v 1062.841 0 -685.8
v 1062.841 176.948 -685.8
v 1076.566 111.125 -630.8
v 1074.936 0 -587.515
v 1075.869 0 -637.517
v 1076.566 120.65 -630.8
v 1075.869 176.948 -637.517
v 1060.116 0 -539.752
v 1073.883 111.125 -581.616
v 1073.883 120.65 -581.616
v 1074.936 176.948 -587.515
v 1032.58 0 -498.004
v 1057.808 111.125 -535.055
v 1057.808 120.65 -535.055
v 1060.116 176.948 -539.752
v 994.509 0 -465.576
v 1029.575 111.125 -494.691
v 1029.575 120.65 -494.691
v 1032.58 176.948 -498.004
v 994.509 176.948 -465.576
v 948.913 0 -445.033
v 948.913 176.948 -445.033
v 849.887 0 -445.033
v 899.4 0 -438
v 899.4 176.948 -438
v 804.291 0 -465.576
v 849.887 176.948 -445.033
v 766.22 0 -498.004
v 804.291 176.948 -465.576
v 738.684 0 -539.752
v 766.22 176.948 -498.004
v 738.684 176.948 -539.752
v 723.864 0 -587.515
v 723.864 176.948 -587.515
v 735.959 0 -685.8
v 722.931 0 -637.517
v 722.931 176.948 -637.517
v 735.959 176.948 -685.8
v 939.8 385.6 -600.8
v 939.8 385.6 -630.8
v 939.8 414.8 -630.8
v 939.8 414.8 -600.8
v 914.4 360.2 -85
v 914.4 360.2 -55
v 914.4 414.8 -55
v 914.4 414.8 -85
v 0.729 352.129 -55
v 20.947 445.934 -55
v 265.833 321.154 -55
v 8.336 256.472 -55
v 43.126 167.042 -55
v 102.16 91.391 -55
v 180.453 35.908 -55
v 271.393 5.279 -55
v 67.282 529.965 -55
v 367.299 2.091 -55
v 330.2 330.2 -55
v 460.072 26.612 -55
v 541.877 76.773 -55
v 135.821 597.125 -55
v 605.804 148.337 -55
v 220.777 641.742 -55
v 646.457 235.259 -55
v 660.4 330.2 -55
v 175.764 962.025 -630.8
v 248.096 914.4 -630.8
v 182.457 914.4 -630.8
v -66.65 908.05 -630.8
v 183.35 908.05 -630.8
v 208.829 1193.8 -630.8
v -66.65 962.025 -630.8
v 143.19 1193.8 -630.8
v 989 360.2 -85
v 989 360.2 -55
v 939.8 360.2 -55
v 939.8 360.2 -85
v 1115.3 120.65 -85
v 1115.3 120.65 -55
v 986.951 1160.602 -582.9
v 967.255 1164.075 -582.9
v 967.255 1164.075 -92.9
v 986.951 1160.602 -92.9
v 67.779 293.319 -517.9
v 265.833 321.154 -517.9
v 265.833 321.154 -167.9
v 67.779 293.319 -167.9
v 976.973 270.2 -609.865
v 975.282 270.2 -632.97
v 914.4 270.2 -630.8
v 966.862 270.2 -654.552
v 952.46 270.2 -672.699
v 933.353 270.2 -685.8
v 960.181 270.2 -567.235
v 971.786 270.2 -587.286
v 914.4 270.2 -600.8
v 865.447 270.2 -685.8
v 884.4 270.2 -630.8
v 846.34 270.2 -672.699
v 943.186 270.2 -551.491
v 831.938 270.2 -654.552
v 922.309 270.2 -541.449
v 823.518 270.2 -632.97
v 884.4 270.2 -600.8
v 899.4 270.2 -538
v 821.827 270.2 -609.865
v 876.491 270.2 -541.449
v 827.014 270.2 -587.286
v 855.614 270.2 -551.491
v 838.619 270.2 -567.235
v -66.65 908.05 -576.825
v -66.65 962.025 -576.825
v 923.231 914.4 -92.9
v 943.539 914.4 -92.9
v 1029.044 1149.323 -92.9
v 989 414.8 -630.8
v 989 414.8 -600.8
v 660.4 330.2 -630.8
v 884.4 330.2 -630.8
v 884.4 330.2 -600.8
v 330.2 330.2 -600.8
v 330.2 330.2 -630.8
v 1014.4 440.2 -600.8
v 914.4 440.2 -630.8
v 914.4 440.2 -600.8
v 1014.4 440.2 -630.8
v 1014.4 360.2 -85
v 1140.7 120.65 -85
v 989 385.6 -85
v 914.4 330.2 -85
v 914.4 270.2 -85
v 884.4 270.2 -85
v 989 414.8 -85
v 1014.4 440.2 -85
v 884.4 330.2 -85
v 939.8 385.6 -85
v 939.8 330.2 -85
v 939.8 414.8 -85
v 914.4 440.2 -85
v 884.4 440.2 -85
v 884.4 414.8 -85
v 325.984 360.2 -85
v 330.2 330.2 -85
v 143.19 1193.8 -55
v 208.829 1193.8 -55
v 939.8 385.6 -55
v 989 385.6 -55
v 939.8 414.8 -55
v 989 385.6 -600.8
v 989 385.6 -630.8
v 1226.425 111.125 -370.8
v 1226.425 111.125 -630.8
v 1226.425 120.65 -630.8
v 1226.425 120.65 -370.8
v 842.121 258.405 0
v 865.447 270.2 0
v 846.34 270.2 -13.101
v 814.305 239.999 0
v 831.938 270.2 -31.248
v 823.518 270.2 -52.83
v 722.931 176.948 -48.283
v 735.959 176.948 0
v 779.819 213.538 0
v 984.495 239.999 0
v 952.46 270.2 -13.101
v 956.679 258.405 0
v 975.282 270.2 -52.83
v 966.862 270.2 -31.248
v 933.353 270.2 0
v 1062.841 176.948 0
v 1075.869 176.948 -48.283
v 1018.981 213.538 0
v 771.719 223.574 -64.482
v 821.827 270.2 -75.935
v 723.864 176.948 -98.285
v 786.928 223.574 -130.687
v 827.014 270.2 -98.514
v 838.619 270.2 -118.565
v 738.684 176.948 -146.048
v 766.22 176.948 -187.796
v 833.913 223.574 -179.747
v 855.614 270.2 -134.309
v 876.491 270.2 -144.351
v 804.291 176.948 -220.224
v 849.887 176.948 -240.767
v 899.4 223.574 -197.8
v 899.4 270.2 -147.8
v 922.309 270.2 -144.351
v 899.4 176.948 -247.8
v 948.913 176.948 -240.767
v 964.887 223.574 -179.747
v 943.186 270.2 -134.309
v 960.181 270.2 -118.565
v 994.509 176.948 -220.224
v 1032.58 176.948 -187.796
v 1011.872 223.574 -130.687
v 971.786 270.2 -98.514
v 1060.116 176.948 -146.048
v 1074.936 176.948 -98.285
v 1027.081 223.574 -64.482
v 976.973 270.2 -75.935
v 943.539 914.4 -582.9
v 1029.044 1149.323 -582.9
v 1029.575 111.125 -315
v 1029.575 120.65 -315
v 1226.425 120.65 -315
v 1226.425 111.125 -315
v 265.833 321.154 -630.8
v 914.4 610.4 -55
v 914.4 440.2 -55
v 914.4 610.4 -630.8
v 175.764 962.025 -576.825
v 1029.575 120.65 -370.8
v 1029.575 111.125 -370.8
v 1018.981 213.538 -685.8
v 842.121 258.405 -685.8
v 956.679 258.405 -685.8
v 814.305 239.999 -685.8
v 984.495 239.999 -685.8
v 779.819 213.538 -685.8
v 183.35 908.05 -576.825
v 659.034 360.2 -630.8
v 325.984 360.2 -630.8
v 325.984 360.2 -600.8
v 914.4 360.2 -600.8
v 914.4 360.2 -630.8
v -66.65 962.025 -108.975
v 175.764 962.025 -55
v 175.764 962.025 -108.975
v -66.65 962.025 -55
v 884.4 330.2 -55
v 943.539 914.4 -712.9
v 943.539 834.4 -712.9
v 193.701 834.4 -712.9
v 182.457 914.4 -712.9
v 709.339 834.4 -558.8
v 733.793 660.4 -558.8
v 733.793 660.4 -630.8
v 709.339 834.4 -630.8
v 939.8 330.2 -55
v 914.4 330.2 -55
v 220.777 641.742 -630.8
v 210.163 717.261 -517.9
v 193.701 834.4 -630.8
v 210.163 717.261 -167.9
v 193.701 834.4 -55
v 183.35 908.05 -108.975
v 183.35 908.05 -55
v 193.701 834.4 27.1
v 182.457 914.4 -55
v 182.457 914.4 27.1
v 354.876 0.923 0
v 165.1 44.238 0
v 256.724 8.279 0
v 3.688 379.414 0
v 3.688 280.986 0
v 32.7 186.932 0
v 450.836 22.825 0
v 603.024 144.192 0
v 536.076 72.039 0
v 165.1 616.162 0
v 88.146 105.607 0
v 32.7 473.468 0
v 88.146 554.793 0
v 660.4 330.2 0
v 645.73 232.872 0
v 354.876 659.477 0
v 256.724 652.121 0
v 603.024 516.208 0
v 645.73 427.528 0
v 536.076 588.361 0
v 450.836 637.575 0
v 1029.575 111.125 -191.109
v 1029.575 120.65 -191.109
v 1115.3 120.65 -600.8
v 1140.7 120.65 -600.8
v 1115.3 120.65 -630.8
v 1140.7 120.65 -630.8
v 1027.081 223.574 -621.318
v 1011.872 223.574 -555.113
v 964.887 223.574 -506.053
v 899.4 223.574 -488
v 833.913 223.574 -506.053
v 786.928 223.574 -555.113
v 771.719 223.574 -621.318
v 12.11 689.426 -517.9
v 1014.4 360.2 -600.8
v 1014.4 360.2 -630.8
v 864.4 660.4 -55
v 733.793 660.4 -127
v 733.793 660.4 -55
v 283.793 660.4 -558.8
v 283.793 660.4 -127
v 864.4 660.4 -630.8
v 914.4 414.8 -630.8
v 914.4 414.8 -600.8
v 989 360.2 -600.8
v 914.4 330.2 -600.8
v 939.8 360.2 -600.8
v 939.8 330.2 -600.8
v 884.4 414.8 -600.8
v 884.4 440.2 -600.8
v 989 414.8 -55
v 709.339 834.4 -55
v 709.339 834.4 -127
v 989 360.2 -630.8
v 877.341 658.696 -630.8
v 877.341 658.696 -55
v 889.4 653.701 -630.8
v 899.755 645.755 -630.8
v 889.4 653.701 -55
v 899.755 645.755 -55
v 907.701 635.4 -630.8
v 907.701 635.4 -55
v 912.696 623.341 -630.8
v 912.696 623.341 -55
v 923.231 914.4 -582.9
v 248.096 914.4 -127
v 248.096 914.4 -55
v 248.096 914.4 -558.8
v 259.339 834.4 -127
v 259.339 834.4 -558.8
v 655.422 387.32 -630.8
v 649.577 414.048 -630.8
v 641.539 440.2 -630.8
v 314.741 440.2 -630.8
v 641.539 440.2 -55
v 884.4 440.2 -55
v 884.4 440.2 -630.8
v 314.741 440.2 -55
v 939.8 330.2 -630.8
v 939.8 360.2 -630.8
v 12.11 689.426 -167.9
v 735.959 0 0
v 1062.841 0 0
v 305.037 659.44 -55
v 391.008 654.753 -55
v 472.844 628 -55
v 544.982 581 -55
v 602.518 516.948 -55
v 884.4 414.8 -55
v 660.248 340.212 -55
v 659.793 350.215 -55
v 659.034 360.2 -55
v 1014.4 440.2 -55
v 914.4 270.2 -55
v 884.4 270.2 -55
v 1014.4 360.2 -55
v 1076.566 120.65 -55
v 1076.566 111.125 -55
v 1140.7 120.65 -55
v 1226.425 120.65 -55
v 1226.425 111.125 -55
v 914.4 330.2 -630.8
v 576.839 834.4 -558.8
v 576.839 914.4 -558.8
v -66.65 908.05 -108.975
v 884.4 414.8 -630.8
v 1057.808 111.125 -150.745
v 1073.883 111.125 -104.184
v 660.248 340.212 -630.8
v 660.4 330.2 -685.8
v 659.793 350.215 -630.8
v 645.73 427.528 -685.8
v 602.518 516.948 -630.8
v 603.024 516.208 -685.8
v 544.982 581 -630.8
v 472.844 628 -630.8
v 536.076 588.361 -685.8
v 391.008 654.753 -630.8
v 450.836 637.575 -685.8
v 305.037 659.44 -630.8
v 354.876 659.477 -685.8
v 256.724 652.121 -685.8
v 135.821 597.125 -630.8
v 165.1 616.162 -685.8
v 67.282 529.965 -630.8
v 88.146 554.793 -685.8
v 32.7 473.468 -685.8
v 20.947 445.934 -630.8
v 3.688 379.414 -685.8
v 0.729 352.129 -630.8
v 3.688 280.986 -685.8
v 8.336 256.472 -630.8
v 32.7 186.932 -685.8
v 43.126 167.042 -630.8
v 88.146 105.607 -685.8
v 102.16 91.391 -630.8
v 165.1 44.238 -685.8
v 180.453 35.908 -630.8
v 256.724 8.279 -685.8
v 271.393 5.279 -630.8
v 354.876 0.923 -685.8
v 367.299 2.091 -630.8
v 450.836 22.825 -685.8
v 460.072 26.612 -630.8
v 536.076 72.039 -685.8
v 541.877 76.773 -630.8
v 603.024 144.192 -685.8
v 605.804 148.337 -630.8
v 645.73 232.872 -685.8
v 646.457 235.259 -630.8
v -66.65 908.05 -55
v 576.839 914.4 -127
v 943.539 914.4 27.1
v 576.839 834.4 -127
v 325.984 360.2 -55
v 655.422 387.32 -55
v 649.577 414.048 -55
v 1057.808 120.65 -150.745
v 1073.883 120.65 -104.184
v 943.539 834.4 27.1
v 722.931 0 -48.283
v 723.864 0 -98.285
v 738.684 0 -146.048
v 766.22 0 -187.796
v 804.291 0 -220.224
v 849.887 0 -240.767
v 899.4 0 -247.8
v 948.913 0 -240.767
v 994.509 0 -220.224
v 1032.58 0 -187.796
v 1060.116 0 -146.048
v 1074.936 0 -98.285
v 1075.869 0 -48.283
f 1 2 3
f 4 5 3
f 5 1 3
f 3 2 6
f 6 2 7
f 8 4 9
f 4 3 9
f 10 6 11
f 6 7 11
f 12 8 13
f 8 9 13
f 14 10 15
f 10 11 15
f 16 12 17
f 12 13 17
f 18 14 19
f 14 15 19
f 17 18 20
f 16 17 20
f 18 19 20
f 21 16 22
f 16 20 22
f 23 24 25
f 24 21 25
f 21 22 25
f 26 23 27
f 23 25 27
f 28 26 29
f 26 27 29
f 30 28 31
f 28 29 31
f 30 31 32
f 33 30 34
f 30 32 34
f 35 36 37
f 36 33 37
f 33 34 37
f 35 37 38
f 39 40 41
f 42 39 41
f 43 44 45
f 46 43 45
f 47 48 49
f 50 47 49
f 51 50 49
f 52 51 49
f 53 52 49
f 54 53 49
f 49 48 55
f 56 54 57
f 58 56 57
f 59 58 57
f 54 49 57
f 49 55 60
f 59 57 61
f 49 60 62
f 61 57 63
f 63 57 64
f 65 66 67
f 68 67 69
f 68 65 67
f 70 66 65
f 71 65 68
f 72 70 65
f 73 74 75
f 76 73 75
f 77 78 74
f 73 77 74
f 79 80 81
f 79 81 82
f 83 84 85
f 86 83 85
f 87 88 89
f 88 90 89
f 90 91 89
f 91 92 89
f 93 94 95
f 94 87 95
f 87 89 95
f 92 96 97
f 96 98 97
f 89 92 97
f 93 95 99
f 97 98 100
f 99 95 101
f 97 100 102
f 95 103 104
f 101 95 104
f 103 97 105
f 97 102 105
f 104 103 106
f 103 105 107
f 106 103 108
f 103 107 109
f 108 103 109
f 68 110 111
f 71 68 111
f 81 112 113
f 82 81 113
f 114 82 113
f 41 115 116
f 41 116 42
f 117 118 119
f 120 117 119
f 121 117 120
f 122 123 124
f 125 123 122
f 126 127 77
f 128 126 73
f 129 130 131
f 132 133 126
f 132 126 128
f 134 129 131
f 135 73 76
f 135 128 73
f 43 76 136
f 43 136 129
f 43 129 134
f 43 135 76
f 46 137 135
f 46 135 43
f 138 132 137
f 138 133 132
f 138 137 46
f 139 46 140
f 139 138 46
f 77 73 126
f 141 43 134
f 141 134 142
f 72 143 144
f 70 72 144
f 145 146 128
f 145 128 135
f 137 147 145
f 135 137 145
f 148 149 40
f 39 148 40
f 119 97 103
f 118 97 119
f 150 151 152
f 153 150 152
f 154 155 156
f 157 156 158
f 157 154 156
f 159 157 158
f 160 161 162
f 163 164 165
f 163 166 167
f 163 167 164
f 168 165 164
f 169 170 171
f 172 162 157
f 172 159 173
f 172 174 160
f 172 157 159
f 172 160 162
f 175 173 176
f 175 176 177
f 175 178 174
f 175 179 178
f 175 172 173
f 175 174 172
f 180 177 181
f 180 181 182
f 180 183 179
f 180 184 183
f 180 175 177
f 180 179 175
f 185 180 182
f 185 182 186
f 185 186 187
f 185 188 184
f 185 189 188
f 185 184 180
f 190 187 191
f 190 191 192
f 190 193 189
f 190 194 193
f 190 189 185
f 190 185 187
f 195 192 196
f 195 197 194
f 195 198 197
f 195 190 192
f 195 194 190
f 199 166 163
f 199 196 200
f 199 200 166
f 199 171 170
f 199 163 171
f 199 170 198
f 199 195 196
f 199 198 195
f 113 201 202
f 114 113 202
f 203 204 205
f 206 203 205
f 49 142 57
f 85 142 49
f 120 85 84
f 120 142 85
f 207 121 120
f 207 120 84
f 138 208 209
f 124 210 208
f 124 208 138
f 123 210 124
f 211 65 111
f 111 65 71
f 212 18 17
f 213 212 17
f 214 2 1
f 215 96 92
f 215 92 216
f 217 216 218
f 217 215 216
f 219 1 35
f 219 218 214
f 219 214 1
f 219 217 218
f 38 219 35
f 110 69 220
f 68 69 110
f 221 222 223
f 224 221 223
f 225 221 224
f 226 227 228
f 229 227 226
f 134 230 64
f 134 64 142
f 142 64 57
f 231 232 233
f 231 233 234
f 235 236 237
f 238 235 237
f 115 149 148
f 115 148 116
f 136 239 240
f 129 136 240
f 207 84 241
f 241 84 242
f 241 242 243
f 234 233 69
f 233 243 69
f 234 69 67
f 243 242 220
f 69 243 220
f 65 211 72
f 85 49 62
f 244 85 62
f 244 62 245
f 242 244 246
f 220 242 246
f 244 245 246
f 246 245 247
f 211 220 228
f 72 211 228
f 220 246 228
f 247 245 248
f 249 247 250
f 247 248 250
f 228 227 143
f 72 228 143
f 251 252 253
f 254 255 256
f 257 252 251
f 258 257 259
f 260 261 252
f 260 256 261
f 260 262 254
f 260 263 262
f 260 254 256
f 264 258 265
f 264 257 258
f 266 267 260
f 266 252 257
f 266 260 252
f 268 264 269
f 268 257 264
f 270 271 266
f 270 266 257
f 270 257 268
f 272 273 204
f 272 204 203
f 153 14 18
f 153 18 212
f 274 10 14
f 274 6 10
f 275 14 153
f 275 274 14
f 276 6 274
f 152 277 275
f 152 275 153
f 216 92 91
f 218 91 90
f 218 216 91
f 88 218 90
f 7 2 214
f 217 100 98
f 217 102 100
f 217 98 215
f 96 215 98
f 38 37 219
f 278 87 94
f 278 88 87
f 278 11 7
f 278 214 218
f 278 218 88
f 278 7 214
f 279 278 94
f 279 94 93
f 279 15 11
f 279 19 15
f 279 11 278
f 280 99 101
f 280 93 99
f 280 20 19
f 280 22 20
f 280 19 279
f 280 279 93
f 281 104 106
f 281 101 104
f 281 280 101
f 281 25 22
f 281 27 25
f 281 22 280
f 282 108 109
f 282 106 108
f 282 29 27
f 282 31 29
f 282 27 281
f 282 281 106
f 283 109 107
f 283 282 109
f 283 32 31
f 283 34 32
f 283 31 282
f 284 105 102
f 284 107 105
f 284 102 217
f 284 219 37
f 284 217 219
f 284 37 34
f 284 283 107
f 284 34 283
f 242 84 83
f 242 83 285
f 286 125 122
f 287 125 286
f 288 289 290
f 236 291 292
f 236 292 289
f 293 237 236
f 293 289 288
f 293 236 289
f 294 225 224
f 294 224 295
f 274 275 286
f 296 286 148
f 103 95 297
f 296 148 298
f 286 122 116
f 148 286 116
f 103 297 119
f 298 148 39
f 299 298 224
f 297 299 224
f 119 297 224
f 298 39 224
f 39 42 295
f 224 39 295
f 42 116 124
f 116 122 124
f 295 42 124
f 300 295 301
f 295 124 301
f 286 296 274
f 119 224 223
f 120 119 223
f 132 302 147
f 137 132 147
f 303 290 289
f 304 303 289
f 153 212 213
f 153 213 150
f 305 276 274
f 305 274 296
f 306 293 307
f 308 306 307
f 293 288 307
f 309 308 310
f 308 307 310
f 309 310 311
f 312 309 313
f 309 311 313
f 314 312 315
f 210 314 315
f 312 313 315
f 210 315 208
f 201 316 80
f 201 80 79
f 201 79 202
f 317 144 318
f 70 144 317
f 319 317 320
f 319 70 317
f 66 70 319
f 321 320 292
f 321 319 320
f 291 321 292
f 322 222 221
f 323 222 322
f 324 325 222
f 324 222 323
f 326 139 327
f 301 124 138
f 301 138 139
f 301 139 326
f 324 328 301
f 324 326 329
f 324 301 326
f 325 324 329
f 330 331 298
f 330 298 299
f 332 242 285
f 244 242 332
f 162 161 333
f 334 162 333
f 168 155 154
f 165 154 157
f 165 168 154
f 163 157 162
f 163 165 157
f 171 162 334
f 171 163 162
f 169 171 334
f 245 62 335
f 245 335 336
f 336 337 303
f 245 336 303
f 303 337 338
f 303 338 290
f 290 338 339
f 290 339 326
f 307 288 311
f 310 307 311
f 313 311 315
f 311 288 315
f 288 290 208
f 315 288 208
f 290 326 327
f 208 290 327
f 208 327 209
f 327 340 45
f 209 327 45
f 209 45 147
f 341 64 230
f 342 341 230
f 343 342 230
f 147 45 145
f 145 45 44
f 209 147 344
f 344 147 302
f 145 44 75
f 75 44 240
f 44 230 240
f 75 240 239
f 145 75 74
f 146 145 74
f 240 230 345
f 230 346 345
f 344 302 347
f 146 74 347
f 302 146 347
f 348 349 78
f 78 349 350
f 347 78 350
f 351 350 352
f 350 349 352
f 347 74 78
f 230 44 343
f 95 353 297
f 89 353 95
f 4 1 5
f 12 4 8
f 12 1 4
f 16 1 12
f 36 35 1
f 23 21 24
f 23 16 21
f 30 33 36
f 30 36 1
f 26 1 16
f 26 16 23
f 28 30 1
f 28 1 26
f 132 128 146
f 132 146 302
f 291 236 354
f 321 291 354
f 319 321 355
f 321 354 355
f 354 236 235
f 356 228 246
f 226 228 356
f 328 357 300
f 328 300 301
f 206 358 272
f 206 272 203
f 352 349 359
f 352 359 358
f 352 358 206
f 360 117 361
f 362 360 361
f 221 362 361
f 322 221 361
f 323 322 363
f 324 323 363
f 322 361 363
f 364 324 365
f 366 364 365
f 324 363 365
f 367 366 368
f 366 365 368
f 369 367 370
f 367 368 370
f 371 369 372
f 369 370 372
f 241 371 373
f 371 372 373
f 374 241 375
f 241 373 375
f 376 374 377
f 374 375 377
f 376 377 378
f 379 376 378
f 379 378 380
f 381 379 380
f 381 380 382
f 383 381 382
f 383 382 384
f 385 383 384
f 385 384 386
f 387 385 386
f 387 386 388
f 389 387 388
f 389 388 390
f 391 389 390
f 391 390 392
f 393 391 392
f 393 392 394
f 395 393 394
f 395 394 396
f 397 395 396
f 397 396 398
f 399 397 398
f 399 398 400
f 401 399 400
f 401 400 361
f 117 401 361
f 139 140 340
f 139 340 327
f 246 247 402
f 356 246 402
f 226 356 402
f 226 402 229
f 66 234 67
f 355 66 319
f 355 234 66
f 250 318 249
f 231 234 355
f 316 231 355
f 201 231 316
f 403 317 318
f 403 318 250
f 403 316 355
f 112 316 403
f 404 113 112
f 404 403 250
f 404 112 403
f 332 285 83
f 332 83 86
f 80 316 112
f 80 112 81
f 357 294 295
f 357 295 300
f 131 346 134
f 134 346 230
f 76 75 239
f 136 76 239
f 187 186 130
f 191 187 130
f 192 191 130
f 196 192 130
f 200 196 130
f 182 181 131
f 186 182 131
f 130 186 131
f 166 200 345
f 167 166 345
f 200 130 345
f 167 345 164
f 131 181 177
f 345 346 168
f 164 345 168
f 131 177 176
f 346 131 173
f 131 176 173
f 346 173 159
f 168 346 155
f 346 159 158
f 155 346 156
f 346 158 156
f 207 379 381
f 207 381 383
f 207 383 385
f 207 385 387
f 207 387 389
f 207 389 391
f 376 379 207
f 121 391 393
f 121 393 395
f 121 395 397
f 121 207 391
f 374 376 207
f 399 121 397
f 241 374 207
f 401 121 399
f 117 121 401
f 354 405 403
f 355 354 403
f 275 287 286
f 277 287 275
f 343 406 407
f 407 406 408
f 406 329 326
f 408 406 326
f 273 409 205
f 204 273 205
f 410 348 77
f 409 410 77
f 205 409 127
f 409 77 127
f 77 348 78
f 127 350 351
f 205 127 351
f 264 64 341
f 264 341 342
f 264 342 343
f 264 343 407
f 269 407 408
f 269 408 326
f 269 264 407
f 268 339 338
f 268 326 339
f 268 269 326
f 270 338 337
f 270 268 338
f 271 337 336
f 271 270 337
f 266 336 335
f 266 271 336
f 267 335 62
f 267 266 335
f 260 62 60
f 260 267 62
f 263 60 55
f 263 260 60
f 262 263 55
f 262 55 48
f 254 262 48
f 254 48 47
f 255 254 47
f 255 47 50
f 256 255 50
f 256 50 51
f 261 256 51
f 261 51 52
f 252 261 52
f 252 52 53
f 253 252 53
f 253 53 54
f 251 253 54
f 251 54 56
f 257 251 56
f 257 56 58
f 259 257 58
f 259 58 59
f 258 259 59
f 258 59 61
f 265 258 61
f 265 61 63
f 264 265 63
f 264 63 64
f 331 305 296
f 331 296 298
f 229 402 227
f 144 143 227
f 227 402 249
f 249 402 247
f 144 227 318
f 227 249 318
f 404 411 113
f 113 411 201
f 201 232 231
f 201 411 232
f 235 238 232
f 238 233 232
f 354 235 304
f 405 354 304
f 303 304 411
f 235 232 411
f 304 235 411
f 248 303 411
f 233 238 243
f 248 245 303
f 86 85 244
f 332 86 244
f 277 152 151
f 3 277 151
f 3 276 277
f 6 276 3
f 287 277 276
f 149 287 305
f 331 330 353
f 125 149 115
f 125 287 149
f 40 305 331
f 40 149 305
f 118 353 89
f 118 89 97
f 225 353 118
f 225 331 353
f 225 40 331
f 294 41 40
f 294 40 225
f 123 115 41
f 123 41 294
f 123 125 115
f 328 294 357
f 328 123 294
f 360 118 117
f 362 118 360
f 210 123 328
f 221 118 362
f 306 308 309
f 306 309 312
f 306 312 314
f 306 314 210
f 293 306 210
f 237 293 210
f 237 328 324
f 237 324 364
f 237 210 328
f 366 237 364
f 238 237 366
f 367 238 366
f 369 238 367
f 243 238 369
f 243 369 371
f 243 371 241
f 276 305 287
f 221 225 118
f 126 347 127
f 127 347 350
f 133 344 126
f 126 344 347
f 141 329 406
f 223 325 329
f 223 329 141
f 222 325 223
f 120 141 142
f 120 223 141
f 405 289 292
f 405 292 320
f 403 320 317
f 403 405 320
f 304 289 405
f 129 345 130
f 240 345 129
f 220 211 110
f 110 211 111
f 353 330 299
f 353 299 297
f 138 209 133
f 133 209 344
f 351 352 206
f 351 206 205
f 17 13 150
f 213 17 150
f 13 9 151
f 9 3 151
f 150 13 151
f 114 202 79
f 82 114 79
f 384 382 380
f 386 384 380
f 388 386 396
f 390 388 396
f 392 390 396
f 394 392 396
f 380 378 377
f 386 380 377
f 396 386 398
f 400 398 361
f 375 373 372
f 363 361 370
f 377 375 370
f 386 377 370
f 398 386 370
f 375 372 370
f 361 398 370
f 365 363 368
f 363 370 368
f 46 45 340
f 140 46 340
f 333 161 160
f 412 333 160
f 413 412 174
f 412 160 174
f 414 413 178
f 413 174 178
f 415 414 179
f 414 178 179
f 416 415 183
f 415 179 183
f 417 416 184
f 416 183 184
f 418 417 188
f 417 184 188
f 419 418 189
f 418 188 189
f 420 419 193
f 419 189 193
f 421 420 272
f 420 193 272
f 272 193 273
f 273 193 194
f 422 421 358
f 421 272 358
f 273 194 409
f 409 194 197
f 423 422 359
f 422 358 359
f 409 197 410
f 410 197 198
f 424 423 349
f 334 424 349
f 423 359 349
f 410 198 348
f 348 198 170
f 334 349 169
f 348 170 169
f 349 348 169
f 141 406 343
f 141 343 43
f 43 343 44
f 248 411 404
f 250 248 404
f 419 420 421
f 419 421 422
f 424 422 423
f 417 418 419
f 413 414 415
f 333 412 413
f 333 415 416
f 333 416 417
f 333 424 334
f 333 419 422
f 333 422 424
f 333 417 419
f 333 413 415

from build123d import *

# Parameters (mm, degrees)
SKETCH1_R                 = 330.2
BOSS_EXTRUDE1_DEPTH       = 55
SKETCH2_R                 = 330.2
BOSS_EXTRUDE2_DEPTH       = 55
BOSS_EXTRUDE3_DEPTH       = 10
BOSS_EXTRUDE6_DEPTH       = 575.8
BOSS_EXTRUDE33_DEPTH      = 370
BOSS_EXTRUDE33_DEPTH_BACK = 370
SKETCH25_W                = 366.7
SKETCH25_H                = 80
SKETCH5_W                 = 450
SKETCH5_H                 = 72
BOSS_EXTRUDE7_DEPTH       = 367.981167426
SKETCH8_W                 = 49.2
SKETCH8_H                 = 29.2
BOSS_EXTRUDE13_DEPTH      = 30
SKETCH19_R                = 177.8
BOSS_EXTRUDE22_DEPTH      = 270.2
CHAMFER1_SIZE             = 100
CHAMFER1_SIZE2            = 93.251508614
BOSS_EXTRUDE27_DEPTH      = 30
BOSS_EXTRUDE20_DEPTH      = 260
SKETCH23_W                = 30
SKETCH23_H                = 60
SKETCH23_W_2              = 49.2
SKETCH23_H_2              = 25.4
SKETCH23_W_3              = 25.4
BOSS_EXTRUDE28_DEPTH      = 30
SKETCH24_R                = 177.8
BOSS_EXTRUDE29_DEPTH      = 270.2
CHAMFER2_SIZE             = 100
CHAMFER2_SIZE2            = 93.251508614
BOSS_EXTRUDE30_DEPTH      = 30
BOSS_EXTRUDE31_DEPTH      = 260
SKETCH16_W                = 250
SKETCH16_H                = 53.975
BOSS_EXTRUDE18_DEPTH      = 53.975
SKETCH18_W                = 250
SKETCH18_H                = 53.975
BOSS_EXTRUDE19_DEPTH      = 53.975
BOSS_EXTRUDE32_REACH      = 1866.083
BOSS_EXTRUDE34_REACH      = 1575.824
SKETCH26_W                = 154.1
SKETCH26_H                = 80
SKETCH27_W                = 350
SKETCH27_H                = 400
BOSS_EXTRUDE35_DEPTH      = 200
BOSS_EXTRUDE36_START      = -130
BOSS_EXTRUDE36_DEPTH      = 490
FILLET3_R                 = 50
SKETCH30_W                = 2623.123535912
SKETCH30_H                = 2390.43733062
CUT_EXTRUDE1_DEPTH        = 1887.551796433
SKETCH31_W                = 2584.765961417
SKETCH31_H                = 1828.147621016
CUT_EXTRUDE2_DEPTH        = 1855.050466041


with BuildPart() as part:
    # Sketch1 → Boss-Extrude1 (new body)
    with BuildSketch(Plane.XY):
        with Locations((330.2, 330.2)):
            Circle(SKETCH1_R)
    extrude(amount=-BOSS_EXTRUDE1_DEPTH)



with BuildPart() as body_2:
    # Sketch2 → Boss-Extrude2 (new body)
    with BuildSketch(Plane.XY.offset(-685.8)):
        with Locations((330.2, 330.2)):
            Circle(SKETCH2_R)
    extrude(amount=BOSS_EXTRUDE2_DEPTH)


with BuildPart() as part_1:
    add(part.part)

    add(body_2.part)  # Boss-Extrude3 merges body 2
    # 3DSketch2 → Boss-Extrude3 (add)
    with BuildSketch(Plane(origin=(330.2, 460, -630.8), x_dir=(0.5893057409504111, 0, 0.807910108664873), z_dir=(0, -1, 0))):
        Polygon((465.194640569, 339.322245639), (0, 0), (247.508411199, -339.322245639), (712.703051768, 0), align=None)
        Polygon((-38.304873162, 52.514157063), (0, 0), (465.194640569, 339.322245639), (426.889767407, 391.836402702), align=None)
    extrude(amount=-BOSS_EXTRUDE3_DEPTH)

    # Sketch4 → Boss-Extrude6 (add)
    with BuildSketch(Plane(origin=(0, -170.8, -630.8), x_dir=(1, 0, 0), z_dir=(0, 0, 1))):
        Polygon((208.828935151, 1364.6), (330.2, 501), (265.832575532, 491.953748438), (143.190142937, 1364.6), align=None)
    extrude(amount=BOSS_EXTRUDE6_DEPTH)

    # Sketch5 → Boss-Extrude7 (add, along a direction that is not the sketch's normal)
    with BuildSketch(Plane(origin=(0, 470, 0), x_dir=(1, 0, 0), z_dir=(0, 1, 0))):
        with Locations((535.552391309, 91)):
            Rectangle(SKETCH5_W, SKETCH5_H)
        with Locations((535.552391309, 594.8)):
            Rectangle(SKETCH5_W, SKETCH5_H)
    extrude(amount=BOSS_EXTRUDE7_DEPTH, dir=(-0.13917310096006222, 0.9902680687415708, 0))

    # Sketch8 → Boss-Extrude13 (add)
    with BuildSketch(Plane(origin=(0, 0, -630.8), x_dir=(-1, 0, 0), z_dir=(0, 0, -1))):
        Polygon((-1014.4, 360.2), (-939.8, 360.2), (-939.8, 330.2), (-914.4, 330.2), (-914.4, 270.2), (-884.4, 270.2), (-884.4, 330.2), (-330.2, 330.2), (-325.983774959, 360.2), (-914.4, 360.2), (-914.4, 414.8), (-884.4, 414.8), (-884.4, 440.2), (-1014.4, 440.2), align=None)
        with Locations((-964.4, 400.2)):
            Rectangle(SKETCH8_W, SKETCH8_H, mode=Mode.SUBTRACT)
    extrude(amount=-BOSS_EXTRUDE13_DEPTH)

    # Sketch19 → Boss-Extrude22 (add)
    with BuildSketch(Plane.XZ.offset(-270.2)):
        with Locations(Location((899.4, -615.8, 0), (0, 0, 90))):
            Circle(SKETCH19_R)
    extrude(amount=BOSS_EXTRUDE22_DEPTH)

    # Chamfer1
    chamfer1_edges = [part_1.edges().sort_by_distance(p)[0] for p in [
        (899.4, 270.2, -793.6),
    ]]
    chamfer1_side = [part_1.faces().sort_by_distance(p)[0] for p in [
        (899.4, 270.2, -788.571056572),
    ]]
    chamfer(chamfer1_edges, length=CHAMFER1_SIZE, length2=CHAMFER1_SIZE2, reference=chamfer1_side[0])

    # Sketch8<7> → Boss-Extrude27 (add)
    with BuildSketch(Plane(origin=(0, 0, -630.8), x_dir=(-1, 0, 0), z_dir=(0, 0, -1))):
        Polygon((-1014.4, 360.2), (-1140.7, 120.65), (-1115.3, 120.65), (-989, 360.2), align=None)
    extrude(amount=-BOSS_EXTRUDE27_DEPTH)

    # Sketch8<4> → Boss-Extrude20 (add)
    with BuildSketch(Plane(origin=(0, 0, -630.8), x_dir=(-1, 0, 0), z_dir=(0, 0, -1))):
        Polygon((-1226.425, 111.125), (-1226.425, 120.65), (-1140.7, 120.65), (-1115.3, 120.65), (-1029.575, 120.65), (-1029.575, 111.125), align=None)
    extrude(amount=-BOSS_EXTRUDE20_DEPTH)

    # Sketch23 → Boss-Extrude28 (add)
    with BuildSketch(Plane(origin=(0, 0, -55), x_dir=(-1, 0, 0), z_dir=(0, 0, -1))):
        with BuildLine():
            Line((-330.2, 360.2), (-659.034365601, 360.2))
            ThreePointArc((-659.034365601, 360.2), (-660.058414719, 345.215533268), (-660.4, 330.2))
            Line((-660.4, 330.2), (-330.2, 330.2))
            Line((-330.2, 330.2), (-330.2, 360.2))
        make_face()
        with BuildLine():
            Line((-914.4, 360.2), (-939.8, 360.2))
            Line((-939.8, 360.2), (-939.8, 330.2))
            Line((-939.8, 330.2), (-914.4, 330.2))
            Line((-914.4, 330.2), (-884.4, 330.2))
            Line((-884.4, 330.2), (-660.4, 330.2))
            ThreePointArc((-660.4, 330.2), (-660.058414719, 345.215533268), (-659.034365601, 360.2))
            Line((-659.034365601, 360.2), (-914.4, 360.2))
        make_face()
        with Locations((-899.4, 300.2)):
            Rectangle(SKETCH23_W, SKETCH23_H)
        Polygon((-939.8, 385.6), (-939.8, 360.2), (-914.4, 360.2), (-914.4, 414.8), (-914.4, 440.2), (-939.8, 440.2), (-939.8, 414.8), align=None)
        with Locations((-964.4, 372.9)):
            Rectangle(SKETCH23_W_2, SKETCH23_H_2)
        with Locations((-964.4, 427.5)):
            Rectangle(SKETCH23_W_2, SKETCH23_H_2)
        Polygon((-1014.4, 440.2), (-1014.4, 385.6), (-989, 385.6), (-989, 414.8), (-989, 440.2), align=None)
        with Locations((-1001.7, 372.9)):
            Rectangle(SKETCH23_W_3, SKETCH23_H_2)
        Polygon((-325.983774959, 360.2), (-330.2, 360.2), (-330.2, 330.2), align=None)
        with Locations((-899.4, 427.5)):
            Rectangle(SKETCH23_W, SKETCH23_H_2)
    extrude(amount=BOSS_EXTRUDE28_DEPTH)

    # Sketch24 → Boss-Extrude29 (add)
    with BuildSketch(Plane(origin=(0, 270.2, 0), x_dir=(-1, 0, 0), z_dir=(0, -1, 0))):
        with Locations(Location((-899.4, 70, 0), (0, 0, 270))):
            Circle(SKETCH24_R)
    extrude(amount=BOSS_EXTRUDE29_DEPTH)

    # Chamfer2
    chamfer2_edges = [part_1.edges().sort_by_distance(p)[0] for p in [
        (899.4, 270.2, -247.8),
    ]]
    chamfer2_side = [part_1.faces().sort_by_distance(p)[0] for p in [
        (899.4, 270.2, -242.771056572),
    ]]
    chamfer(chamfer2_edges, length=CHAMFER2_SIZE, length2=CHAMFER2_SIZE2, reference=chamfer2_side[0])

    # Sketch23<10> → Boss-Extrude30 (add)
    with BuildSketch(Plane(origin=(0, 0, -55), x_dir=(-1, 0, 0), z_dir=(0, 0, -1))):
        Polygon((-1014.4, 360.2), (-1140.7, 120.65), (-1115.3, 120.65), (-989, 360.2), align=None)
    extrude(amount=BOSS_EXTRUDE30_DEPTH)

    # Sketch23<12> → Boss-Extrude31 (add)
    with BuildSketch(Plane(origin=(0, 0, -55), x_dir=(-1, 0, 0), z_dir=(0, 0, -1))):
        Polygon((-1226.425, 111.125), (-1226.425, 120.65), (-1140.7, 120.65), (-1115.3, 120.65), (-1029.575, 120.65), (-1029.575, 111.125), align=None)
    extrude(amount=BOSS_EXTRUDE31_DEPTH)

    # Sketch16 → Boss-Extrude18 (add)
    with BuildSketch(Plane(origin=(0, 0, -630.8), x_dir=(-1, 0, 0), z_dir=(0, 0, -1))):
        with Locations((-58.349686454, 935.0375)):
            Rectangle(SKETCH16_W, SKETCH16_H)
    extrude(amount=-BOSS_EXTRUDE18_DEPTH)

    # Sketch18 → Boss-Extrude19 (add)
    with BuildSketch(Plane(origin=(0, 0, -55), x_dir=(-1, 0, 0), z_dir=(0, 0, -1))):
        with Locations((-58.349686454, 935.0375)):
            Rectangle(SKETCH18_W, SKETCH18_H)
    extrude(amount=BOSS_EXTRUDE19_DEPTH)

    # Boss-Extrude32: up to this face of the body (flat: up to its plane)
    boss_extrude32_end = Plane(part_1.part.faces().sort_by_distance((283.205191665, 255.458003874, -55))[0])
    # Sketch8<8> → Boss-Extrude32 (add, up to the picked face)
    with BuildSketch(Plane(origin=(0, 0, -630.8), x_dir=(-1, 0, 0), z_dir=(0, 0, -1)), mode=Mode.PRIVATE) as boss_extrude32_sk1:
        Polygon((-314.740508183, 440.2), (-283.793416381, 660.4), (-914.4, 660.4), (-914.4, 440.2), align=None)
    boss_extrude32_tool1 = split(extrude(boss_extrude32_sk1.sketch, amount=-BOSS_EXTRUDE32_REACH, mode=Mode.PRIVATE), bisect_by=boss_extrude32_end, keep=Keep.BOTH, mode=Mode.PRIVATE)
    add(boss_extrude32_tool1.solids().sort_by(Axis((606.768609, 551.223181, -630.8), (0, 0, 1)))[0])



with BuildPart() as body_2_2:
    # Sketch25 → Boss-Extrude33 (new, two sides: drawn at the far end of the back side and taken through both)
    with BuildSketch(Plane.XY.offset(-342.9).offset(-BOSS_EXTRUDE33_DEPTH_BACK)):
        with Locations((760.189311143, 874.4)):
            Rectangle(SKETCH25_W, SKETCH25_H)
    extrude(amount=BOSS_EXTRUDE33_DEPTH + BOSS_EXTRUDE33_DEPTH_BACK)


with BuildPart() as part_2:
    add(part_1.part)

    add(body_2_2.part)  # Boss-Extrude34 merges body 2 2
    # Boss-Extrude34: up to this plane
    boss_extrude34_end = Plane(origin=(143.190142937, 1193.8, 837.459616456), z_dir=(0.9902680687415708, 0.13917310096006216, 0))
    # Sketch26 → Boss-Extrude34 (add, up to the surface)
    with BuildSketch(Plane.ZY.offset(-576.839311143), mode=Mode.PRIVATE) as boss_extrude34_sk1:
        with Locations((-49.95, 874.4)):
            Rectangle(SKETCH26_W, SKETCH26_H)
    boss_extrude34_tool1 = split(extrude(boss_extrude34_sk1.sketch, amount=BOSS_EXTRUDE34_REACH, mode=Mode.PRIVATE), bisect_by=boss_extrude34_end, keep=Keep.BOTH, mode=Mode.PRIVATE)
    add(boss_extrude34_tool1.solids().sort_by_distance((576.839311, 874.4, -49.95))[0])
    # Sketch26 → Boss-Extrude34 (add, up to the surface)
    with BuildSketch(Plane.ZY.offset(-576.839311143), mode=Mode.PRIVATE) as boss_extrude34_sk2:
        with Locations((-635.85, 874.4)):
            Rectangle(SKETCH26_W, SKETCH26_H)
    boss_extrude34_tool2 = split(extrude(boss_extrude34_sk2.sketch, amount=BOSS_EXTRUDE34_REACH, mode=Mode.PRIVATE), bisect_by=boss_extrude34_end, keep=Keep.BOTH, mode=Mode.PRIVATE)
    add(boss_extrude34_tool2.solids().sort_by_distance((576.839311, 874.4, -635.85))[0])

    # Sketch27 → Boss-Extrude35 (add)
    with BuildSketch(Plane(origin=(304.944608977, 42.857169884, 0), x_dir=(0, 0, 1), z_dir=(-0.9902680687415708, -0.13917310096006216, 0))):
        with Locations((-342.9, 481.031558361)):
            Rectangle(SKETCH27_W, SKETCH27_H)
    extrude(amount=BOSS_EXTRUDE35_DEPTH)

    # Sketch29 → Boss-Extrude36 (add)
    with BuildSketch(Plane(origin=(0, 0, -712.9), x_dir=(-1, 0, 0), z_dir=(0, 0, -1)).offset(BOSS_EXTRUDE36_START)):
        Polygon((-1029.044346974, 1149.323155196), (-986.95135556, 1160.601938253), (-943.539311143, 914.4), align=None)
        Polygon((-986.95135556, 1160.601938253), (-943.539311143, 914.4), (-923.230778905, 914.4), (-967.2552005, 1164.074901806), align=None)
    extrude(amount=-BOSS_EXTRUDE36_DEPTH)

    # Fillet3
    fillet3_edges = [part_2.edges().sort_by_distance(p)[0] for p in [
        (914.4, 660.4, -342.9),
    ]]
    fillet(fillet3_edges, radius=FILLET3_R)

    # Sketch30 → Cut-Extrude1 (cut, through all)
    with BuildSketch(Plane.XY):
        with Locations((451.826678709, -534.81866531)):
            Rectangle(SKETCH30_W, SKETCH30_H)
    extrude(amount=CUT_EXTRUDE1_DEPTH, mode=Mode.SUBTRACT)

    # Sketch31 → Cut-Extrude2 (cut, through all)
    with BuildSketch(Plane(origin=(0, 0, -685.8), x_dir=(-1, 0, 0), z_dir=(0, 0, -1))):
        with Locations((-741.050727566, -253.673810508)):
            Rectangle(SKETCH31_W, SKETCH31_H)
    extrude(amount=CUT_EXTRUDE2_DEPTH, mode=Mode.SUBTRACT)


solid = part_2.part
